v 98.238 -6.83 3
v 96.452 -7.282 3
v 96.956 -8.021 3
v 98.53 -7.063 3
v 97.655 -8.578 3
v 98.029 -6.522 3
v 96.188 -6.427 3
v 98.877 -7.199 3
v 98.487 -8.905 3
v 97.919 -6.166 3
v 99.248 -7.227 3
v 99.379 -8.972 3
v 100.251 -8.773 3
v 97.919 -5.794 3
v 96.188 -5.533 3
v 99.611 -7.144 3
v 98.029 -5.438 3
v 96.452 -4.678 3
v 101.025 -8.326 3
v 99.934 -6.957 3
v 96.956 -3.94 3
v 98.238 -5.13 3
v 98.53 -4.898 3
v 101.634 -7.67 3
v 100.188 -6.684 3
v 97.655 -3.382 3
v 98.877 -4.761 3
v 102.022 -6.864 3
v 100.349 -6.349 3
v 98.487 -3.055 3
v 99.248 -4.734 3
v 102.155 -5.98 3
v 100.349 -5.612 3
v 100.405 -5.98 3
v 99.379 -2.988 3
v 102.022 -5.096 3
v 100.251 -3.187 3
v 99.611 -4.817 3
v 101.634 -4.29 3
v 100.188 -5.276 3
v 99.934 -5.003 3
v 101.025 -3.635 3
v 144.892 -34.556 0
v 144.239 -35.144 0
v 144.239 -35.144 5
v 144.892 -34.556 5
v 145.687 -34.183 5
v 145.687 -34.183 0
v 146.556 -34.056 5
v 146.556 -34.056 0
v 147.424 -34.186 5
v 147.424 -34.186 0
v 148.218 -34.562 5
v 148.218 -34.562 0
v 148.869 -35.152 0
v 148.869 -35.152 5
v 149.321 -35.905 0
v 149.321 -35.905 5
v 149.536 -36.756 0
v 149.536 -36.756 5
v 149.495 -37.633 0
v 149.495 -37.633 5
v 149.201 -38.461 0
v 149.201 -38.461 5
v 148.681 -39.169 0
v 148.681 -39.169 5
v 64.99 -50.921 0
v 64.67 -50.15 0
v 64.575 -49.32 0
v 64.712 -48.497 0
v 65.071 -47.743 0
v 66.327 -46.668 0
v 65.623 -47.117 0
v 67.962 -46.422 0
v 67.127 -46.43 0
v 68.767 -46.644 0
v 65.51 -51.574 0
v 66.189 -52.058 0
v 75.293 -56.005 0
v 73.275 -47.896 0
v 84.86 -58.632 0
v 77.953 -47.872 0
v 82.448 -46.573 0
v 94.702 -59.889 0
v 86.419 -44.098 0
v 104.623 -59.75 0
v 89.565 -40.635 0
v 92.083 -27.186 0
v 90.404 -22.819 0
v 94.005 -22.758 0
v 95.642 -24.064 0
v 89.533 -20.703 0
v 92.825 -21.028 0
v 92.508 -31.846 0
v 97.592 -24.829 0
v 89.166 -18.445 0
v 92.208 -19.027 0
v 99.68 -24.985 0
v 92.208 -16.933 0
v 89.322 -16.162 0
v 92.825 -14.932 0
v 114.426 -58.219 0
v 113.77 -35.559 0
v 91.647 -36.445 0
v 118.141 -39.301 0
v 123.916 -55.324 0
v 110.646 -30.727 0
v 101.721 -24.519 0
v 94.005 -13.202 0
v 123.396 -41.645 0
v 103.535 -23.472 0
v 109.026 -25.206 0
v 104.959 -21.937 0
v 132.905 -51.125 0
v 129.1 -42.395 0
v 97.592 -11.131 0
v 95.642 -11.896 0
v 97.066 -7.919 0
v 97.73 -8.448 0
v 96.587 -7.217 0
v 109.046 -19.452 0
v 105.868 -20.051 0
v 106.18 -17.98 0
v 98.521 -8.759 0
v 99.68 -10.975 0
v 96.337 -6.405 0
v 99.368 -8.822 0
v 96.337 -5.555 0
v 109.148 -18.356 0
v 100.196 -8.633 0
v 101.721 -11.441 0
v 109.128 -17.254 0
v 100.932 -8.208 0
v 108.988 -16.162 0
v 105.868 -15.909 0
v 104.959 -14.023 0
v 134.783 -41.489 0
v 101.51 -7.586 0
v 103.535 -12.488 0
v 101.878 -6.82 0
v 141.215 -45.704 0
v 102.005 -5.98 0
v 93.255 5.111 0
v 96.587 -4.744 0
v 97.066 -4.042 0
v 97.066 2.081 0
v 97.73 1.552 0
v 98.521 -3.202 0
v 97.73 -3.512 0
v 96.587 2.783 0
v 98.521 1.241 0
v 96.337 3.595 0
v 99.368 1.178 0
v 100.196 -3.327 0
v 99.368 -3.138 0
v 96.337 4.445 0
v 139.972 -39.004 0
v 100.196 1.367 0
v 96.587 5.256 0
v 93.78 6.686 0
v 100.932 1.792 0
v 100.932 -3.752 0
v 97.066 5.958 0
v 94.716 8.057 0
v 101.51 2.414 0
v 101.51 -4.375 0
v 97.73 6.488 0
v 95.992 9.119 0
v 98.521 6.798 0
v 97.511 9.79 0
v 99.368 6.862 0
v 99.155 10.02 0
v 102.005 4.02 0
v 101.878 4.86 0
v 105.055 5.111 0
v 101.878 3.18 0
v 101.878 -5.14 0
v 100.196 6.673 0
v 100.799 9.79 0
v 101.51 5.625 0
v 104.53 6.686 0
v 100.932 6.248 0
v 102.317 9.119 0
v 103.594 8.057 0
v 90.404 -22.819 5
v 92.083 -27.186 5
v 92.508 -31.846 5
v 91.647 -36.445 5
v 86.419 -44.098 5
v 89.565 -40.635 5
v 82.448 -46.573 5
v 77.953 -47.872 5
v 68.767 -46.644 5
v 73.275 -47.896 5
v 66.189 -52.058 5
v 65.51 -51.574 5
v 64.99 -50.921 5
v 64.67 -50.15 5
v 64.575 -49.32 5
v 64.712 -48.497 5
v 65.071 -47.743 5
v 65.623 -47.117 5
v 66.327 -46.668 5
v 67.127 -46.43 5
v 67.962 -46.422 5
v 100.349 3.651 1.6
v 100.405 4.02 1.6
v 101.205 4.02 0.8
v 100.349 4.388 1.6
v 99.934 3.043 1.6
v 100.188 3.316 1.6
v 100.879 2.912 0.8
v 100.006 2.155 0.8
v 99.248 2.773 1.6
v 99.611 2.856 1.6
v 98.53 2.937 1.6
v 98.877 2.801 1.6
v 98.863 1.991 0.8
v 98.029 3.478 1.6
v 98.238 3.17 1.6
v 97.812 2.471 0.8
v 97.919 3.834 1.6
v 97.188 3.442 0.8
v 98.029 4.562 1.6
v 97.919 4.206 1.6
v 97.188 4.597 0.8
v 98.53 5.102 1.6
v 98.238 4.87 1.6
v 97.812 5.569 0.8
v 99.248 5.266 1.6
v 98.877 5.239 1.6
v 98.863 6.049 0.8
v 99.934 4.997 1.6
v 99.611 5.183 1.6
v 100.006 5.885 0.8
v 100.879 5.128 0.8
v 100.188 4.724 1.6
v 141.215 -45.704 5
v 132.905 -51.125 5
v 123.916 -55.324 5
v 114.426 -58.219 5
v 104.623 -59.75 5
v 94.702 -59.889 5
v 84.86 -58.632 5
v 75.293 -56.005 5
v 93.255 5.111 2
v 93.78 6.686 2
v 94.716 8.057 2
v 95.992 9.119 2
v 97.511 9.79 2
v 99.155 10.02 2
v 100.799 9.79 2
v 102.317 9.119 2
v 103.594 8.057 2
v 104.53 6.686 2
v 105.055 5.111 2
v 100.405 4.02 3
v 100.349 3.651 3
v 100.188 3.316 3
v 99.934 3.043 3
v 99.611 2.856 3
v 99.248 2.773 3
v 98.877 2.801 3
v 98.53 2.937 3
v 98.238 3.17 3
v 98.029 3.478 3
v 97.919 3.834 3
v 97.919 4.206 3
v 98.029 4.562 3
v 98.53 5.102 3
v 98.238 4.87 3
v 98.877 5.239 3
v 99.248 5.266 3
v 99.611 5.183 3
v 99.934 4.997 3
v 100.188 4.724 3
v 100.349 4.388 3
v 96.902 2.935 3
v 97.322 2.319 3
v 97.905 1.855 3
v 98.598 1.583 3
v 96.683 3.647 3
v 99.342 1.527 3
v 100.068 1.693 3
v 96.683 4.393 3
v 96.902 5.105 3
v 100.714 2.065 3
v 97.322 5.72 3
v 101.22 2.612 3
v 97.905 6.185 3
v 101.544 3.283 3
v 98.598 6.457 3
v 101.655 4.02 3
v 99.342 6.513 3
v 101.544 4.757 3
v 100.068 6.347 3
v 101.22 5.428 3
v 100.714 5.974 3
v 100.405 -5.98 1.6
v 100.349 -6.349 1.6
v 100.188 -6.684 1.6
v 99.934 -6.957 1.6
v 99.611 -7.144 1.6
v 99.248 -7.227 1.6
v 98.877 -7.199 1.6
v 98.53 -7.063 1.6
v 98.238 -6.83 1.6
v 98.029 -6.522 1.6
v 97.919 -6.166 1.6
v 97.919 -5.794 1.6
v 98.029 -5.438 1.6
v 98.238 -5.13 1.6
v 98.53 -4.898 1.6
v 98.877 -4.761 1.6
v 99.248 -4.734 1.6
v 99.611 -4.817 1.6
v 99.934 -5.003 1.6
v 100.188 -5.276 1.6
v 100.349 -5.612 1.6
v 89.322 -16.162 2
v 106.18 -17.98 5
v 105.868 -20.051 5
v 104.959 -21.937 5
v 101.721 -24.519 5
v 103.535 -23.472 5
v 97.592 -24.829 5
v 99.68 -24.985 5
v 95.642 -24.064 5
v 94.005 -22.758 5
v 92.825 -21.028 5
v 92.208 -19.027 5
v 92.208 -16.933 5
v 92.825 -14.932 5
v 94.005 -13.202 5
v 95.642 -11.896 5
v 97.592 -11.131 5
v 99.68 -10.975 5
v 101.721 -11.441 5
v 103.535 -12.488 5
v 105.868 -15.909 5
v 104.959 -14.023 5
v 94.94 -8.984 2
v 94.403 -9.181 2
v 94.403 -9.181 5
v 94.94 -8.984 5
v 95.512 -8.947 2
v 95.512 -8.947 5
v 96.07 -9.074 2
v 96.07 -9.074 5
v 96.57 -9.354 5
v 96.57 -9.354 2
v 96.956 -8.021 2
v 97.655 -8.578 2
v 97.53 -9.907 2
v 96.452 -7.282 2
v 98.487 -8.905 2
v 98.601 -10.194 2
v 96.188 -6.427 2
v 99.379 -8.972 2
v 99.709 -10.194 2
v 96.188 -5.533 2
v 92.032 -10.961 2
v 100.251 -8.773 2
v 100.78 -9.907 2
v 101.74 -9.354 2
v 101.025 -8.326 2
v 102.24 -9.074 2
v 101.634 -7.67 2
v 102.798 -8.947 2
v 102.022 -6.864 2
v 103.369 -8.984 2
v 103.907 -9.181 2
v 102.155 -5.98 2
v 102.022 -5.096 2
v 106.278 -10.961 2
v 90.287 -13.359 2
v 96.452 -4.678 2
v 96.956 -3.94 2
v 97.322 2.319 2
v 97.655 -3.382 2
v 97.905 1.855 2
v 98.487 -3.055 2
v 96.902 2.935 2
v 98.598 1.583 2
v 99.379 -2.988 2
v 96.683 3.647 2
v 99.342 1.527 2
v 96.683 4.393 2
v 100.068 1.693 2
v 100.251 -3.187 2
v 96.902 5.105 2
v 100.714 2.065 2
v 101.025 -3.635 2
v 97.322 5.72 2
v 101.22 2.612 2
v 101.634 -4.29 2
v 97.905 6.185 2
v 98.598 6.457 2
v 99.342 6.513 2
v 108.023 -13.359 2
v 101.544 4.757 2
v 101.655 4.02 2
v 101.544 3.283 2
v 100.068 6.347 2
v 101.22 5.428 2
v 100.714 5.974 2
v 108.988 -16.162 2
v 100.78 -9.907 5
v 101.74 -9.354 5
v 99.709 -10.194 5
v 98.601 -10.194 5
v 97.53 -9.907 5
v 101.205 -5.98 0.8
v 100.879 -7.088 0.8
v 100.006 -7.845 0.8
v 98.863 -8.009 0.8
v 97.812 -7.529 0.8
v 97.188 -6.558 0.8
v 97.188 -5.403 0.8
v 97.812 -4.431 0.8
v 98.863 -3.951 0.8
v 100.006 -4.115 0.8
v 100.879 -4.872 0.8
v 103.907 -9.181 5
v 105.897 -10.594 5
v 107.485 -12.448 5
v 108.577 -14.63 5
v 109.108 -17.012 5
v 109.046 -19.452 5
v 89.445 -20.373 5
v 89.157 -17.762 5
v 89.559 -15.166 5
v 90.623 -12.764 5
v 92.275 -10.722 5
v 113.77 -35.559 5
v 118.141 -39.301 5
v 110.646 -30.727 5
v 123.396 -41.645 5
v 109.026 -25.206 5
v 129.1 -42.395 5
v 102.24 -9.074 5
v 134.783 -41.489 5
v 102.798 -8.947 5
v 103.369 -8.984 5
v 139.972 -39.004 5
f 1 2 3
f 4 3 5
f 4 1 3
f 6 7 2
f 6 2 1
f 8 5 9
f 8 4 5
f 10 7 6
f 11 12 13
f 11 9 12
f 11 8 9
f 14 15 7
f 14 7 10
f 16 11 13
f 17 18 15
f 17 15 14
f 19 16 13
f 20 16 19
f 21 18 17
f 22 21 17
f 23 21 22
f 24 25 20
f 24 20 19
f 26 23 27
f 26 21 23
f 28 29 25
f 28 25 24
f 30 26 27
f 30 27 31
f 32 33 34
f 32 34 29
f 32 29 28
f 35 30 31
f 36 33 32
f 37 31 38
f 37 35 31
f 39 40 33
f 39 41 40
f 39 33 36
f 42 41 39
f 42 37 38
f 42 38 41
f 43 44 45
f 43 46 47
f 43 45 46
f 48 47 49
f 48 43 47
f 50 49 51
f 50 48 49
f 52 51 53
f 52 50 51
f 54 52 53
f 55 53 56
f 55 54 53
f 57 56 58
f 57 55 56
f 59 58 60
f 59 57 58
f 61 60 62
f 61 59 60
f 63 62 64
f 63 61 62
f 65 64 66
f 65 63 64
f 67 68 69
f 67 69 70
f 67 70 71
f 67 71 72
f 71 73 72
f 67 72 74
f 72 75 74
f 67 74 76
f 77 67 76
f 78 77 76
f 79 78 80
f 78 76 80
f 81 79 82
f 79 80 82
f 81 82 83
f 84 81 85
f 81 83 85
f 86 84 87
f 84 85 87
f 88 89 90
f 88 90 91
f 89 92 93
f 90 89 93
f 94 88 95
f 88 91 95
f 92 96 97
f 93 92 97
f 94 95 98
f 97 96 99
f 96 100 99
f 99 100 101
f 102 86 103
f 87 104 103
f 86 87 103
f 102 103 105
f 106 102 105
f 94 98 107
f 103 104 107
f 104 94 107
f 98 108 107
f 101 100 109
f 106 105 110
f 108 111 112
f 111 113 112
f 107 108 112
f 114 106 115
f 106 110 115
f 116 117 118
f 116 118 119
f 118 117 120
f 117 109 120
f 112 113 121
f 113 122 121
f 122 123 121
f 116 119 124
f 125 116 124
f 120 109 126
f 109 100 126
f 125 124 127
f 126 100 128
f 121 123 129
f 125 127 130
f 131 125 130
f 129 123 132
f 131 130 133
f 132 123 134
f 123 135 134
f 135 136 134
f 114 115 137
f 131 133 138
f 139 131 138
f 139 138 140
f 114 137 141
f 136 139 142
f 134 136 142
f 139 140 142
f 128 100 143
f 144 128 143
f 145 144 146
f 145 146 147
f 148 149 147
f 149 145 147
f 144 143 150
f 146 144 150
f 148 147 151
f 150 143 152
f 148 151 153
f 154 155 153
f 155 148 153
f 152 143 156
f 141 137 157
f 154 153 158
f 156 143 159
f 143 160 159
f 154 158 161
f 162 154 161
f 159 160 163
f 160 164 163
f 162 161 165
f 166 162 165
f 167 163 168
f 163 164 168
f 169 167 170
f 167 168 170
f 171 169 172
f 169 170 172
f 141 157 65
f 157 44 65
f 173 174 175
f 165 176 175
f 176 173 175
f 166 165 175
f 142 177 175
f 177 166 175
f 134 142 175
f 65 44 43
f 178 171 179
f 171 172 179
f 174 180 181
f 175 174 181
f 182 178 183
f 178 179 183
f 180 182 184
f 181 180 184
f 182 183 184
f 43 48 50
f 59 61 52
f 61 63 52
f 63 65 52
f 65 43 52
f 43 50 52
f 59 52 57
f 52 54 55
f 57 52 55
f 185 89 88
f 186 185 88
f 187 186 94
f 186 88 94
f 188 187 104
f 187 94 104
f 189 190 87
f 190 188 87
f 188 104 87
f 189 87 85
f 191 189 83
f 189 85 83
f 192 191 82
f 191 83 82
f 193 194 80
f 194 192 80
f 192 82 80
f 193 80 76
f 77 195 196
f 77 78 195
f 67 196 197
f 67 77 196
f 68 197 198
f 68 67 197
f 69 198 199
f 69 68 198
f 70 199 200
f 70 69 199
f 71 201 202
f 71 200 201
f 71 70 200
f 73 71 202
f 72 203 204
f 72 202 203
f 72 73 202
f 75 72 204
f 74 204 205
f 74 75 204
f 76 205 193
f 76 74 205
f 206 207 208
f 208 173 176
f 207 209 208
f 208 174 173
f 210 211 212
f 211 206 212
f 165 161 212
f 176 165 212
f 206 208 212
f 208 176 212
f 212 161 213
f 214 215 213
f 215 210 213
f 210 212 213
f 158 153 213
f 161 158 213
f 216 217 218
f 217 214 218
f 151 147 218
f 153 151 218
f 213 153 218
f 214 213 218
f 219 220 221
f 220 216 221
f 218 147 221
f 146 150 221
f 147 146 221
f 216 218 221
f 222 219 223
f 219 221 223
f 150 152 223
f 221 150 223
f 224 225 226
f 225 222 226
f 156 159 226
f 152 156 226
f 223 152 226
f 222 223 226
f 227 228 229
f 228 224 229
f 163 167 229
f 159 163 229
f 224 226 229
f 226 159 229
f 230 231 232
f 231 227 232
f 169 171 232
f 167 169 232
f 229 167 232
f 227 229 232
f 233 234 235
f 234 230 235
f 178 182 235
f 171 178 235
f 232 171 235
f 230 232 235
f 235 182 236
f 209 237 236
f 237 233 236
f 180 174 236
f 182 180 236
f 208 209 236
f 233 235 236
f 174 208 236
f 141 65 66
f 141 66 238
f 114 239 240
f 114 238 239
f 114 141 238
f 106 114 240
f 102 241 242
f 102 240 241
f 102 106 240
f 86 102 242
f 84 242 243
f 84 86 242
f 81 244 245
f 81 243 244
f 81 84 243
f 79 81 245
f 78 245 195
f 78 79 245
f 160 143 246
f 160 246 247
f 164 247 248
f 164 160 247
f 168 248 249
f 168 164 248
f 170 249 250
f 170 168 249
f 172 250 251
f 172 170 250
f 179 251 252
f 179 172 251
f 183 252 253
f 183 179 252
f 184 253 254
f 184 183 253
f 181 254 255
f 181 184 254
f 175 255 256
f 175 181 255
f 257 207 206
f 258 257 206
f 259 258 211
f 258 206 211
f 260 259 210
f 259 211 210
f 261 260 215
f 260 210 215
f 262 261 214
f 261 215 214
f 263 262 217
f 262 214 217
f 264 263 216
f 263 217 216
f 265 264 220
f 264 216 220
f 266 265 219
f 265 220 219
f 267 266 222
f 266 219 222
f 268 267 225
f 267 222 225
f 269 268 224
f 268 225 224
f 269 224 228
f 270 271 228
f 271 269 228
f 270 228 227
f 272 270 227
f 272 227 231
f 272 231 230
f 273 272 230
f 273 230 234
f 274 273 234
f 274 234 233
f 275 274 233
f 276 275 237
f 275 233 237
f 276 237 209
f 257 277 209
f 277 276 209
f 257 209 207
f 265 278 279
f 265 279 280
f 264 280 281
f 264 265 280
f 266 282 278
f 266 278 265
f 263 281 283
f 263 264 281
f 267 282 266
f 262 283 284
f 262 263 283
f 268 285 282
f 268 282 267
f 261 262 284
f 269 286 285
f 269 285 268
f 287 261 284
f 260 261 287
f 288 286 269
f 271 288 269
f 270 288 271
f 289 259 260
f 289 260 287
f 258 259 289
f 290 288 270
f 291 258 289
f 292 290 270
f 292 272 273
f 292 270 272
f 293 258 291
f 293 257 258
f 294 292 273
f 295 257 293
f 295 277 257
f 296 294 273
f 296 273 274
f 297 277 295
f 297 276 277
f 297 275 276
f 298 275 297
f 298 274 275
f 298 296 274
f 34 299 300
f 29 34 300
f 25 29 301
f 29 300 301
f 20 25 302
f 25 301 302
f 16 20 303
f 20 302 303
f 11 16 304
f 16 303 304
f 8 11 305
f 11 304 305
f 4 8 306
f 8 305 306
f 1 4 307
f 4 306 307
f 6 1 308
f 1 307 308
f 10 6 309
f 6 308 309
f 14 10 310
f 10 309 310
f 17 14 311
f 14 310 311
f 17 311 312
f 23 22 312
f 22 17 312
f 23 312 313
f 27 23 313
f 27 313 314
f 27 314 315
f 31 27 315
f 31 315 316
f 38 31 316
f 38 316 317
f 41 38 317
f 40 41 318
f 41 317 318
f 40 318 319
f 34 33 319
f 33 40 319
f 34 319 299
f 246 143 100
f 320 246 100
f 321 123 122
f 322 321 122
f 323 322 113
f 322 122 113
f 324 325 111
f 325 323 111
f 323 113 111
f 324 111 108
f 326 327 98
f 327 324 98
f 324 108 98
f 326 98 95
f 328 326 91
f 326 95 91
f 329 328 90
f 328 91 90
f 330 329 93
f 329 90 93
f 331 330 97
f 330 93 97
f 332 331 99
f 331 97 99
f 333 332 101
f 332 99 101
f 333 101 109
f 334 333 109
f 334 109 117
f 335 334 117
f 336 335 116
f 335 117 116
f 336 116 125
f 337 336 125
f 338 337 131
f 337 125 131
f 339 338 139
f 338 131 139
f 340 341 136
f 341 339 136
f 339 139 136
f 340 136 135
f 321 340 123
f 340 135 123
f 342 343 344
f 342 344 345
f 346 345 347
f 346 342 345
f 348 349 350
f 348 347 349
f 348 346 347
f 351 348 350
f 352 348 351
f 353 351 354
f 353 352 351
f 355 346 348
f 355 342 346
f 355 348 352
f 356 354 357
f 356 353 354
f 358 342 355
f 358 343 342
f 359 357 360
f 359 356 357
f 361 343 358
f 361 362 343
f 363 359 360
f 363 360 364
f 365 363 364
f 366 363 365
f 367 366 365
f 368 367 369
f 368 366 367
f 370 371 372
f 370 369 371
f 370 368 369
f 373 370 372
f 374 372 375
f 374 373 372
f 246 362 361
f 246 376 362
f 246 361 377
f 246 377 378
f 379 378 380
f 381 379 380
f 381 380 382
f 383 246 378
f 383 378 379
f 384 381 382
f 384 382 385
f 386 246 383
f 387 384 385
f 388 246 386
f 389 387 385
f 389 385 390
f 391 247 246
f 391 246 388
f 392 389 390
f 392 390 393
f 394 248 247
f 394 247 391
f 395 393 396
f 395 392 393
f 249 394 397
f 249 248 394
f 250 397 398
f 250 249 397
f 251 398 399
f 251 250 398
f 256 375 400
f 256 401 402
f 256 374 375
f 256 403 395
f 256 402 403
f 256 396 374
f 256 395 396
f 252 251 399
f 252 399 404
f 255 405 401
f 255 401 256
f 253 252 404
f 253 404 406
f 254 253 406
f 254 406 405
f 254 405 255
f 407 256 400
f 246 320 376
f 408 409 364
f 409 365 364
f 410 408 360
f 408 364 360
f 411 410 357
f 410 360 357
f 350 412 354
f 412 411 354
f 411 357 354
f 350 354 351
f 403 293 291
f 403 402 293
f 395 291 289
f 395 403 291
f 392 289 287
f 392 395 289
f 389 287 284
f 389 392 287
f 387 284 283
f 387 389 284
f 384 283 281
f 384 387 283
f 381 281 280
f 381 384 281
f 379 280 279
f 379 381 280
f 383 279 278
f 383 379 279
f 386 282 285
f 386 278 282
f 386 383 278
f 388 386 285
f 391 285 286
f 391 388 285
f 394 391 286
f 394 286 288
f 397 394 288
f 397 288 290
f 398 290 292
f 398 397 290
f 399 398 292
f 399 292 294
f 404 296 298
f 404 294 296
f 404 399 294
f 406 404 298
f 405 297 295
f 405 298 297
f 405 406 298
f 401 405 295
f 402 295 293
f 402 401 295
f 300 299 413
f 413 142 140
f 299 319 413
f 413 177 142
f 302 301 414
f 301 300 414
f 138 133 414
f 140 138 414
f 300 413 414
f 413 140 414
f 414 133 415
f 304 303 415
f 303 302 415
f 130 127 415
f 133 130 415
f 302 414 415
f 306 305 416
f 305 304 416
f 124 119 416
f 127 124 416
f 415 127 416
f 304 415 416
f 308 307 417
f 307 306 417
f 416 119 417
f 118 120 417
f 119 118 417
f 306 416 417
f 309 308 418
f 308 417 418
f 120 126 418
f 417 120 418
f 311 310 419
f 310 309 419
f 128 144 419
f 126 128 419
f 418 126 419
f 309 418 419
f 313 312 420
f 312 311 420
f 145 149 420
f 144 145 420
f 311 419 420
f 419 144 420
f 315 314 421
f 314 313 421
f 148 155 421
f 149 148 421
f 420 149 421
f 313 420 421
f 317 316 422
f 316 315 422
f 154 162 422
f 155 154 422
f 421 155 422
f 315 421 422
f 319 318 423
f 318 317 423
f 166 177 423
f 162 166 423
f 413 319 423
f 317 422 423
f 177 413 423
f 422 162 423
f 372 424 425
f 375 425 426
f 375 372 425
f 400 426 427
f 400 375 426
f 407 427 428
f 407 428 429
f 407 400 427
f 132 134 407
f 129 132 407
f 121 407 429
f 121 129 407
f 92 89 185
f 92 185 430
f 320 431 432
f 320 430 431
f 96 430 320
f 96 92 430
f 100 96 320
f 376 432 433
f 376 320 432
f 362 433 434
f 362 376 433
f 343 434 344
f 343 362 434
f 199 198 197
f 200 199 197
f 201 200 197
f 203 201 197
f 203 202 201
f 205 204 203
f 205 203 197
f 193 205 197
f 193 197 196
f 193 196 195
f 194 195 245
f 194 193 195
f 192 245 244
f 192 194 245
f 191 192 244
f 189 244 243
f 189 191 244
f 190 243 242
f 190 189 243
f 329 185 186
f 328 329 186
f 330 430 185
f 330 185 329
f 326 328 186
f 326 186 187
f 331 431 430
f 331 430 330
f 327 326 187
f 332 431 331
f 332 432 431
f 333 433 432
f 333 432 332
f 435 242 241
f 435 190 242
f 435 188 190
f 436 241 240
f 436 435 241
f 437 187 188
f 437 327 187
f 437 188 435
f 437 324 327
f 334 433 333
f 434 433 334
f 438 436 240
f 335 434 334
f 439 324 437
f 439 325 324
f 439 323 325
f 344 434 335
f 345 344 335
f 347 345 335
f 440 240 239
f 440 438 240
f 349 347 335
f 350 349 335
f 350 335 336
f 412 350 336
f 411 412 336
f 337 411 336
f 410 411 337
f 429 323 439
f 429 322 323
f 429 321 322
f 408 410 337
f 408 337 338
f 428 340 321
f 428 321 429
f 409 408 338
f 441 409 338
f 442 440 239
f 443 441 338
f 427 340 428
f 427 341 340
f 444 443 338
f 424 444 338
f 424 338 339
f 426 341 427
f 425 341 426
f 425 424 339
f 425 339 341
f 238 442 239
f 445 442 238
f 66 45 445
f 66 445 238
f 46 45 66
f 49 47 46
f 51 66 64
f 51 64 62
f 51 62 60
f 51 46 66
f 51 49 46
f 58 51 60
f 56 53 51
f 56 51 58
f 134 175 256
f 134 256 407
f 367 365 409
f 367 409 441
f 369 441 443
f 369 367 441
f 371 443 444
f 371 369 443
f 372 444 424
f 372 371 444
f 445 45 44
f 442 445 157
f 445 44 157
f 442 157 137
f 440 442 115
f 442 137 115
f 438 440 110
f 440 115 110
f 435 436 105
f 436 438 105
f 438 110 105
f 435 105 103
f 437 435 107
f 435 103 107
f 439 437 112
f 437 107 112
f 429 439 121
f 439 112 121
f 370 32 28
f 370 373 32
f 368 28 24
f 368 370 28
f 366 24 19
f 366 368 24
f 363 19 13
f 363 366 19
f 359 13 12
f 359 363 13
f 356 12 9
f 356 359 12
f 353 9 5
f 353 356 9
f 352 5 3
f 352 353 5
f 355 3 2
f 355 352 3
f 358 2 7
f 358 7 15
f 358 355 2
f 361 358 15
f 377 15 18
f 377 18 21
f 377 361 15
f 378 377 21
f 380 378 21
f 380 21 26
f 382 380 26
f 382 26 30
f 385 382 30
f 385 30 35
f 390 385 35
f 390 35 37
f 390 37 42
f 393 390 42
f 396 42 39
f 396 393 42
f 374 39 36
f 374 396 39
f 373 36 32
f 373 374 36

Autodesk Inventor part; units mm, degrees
ref_plane "YZ Plane" through (0, 0, 0) normal (1, 0, 0) x (0, 1, 0)
ref_plane "XZ Plane" through (0, 0, 0) normal (0, 1, 0) x (-1, 0, 0)
ref_plane "XY Plane" through (0, 0, 0) normal (0, 0, 1) x (1, 0, 0)
sketch "Sketch1" plane through (0, 0, 0) normal (0, 0, 1) x (1, 0, 0)
  line L0 (64.2929, 13) -> (99.1548, 4.0199) construction
  circle A0 centre (64.2929, 13) radius 3 construction
  circle A1 centre (64.2929, 13) radius 4.025 construction
  circle A2 centre (64.2929, 13) radius 7 construction
  arc A3 (102.6474, 8.8986) -> (63.8399, 19.9853) centre (67.7221, -39.8889) ccw construction
  circle A4 centre (99.1548, 4.0199) radius 2.5
  circle A5 centre (99.1548, 4.0199) radius 3.525
  circle A6 centre (99.1548, 4.0199) radius 6
  line L1 (64.2929, 13) -> (98.9408, 0.0186) construction
  line L2 (99.1548, 4.0199) -> (99.1548, -17.9801) construction
  line L3 (99.1548, -17.9801) -> (98.9408, 0.0186) construction
  circle A7 centre (99.1548, -17.9801) radius 10
  circle A8 centre (99.1548, -17.9801) radius 7.025
  line L4 (105.0548, 5.1108) -> (108.9881, -16.162)
  line L5 (93.2548, 5.1108) -> (89.3215, -16.162)
  line L6 (9.3628, -60) -> (214.5663, -60) construction
  arc A9 (95.4028, -0.6623) -> (65.8301, 6.1709) centre (73.5161, -27.9748) ccw construction
  line L7 (99.1548, 4.0199) -> (66.0447, -51.9827) construction
  line L8 (99.1548, 4.0199) -> (148.8226, -39.0251) construction
  circle A10 centre (67.5736, -49.3967) radius 3
  circle A11 centre (146.5507, -37.0561) radius 3
  arc A12 (68.7666, -46.6441) -> (90.4037, -22.8193) centre (75.5268, -31.046) ccw
  arc A13 (109.0459, -19.4522) -> (144.239, -35.1439) centre (128.828, -22.3964) ccw
  arc A14 (66.0447, -51.9827) -> (148.8226, -39.0251) centre (98.68, 10.4177) ccw
  circle A15 centre (99.1548, -5.9801) radius 1.25
  circle A16 centre (99.1548, -5.9801) radius 3
  circle A17 centre (99.1548, -5.9801) radius 4.25
  circle A18 centre (99.1548, 4.0199) radius 1.25
  arc A19 (103.9067, -9.1813) -> (101.7399, -9.3536) centre (102.9564, -10.9411) ccw
  arc A20 (96.5698, -9.3536) -> (94.4029, -9.1813) centre (95.3533, -10.9411) ccw
  point P0 (0, 0)
  point P1 (0, 0)
  point P2 (66.1895, -52.0583)
  point P3 (148.6808, -39.1685)
  point P4 (97.1242, -8.1885)
  point P5 (102.5276, -8.5661)
  point P6 (95.7821, -8.5661)
  dimension "d19" = 6
  dimension "d20" = 6
  dimension "d0" = 36
  dimension "d1" = 8.05
  dimension "d2" = 6
  dimension "d3" = 14
  dimension "d4" = 60
  dimension "d5" = 37
  dimension "d6" = 22
  dimension "d7" = 18
  dimension "d8" = 12
  dimension "d9" = 7.05
  dimension "d10" = 20
  dimension "d11" = 14.05
  dimension "d12" = 35
  dimension "d13" = 5
  dimension "d14" = 60
  dimension "d15" = 30.593
  dimension "d16" = 49.086
  dimension "d17" = 65.7249
  dimension "d18" = 65.0582
  dimension "d21" = 13
  dimension "d22" = 70.4193
  dimension "d23" = 17
  dimension "d24" = 20
  dimension "d29" = 2.5
  dimension "d30" = 6
  dimension "d31" = 8.5
  dimension "d32" = 2.5
  dimension "d43" = 10
  dimension "d44" = 2
  dimension "d45" = 2
extrude "Extrusion1" add sketch "Sketch1" along normal blind 5 contours A7 A20 A17 A19 | A7 A13 A11 A14 A10 A12 | A10 | A11
extrude "Extrusion3" add sketch "Sketch1" along normal blind 3 contours A4 | A16 A7 | A7 A16
extrude "Extrusion4" add sketch "Sketch1" along normal blind 2 contours A5 | A6 A17 | A6 L4 A7 A17 | A17 A7 A16 A6 | A6 A17 | A6 A17 A7 L5 | A19 A17 A7 | A17 A20 A7 | A7 A16 A17 | A7 A16 picked at (99.1548, -8.3289)
chamfer "Chamfer1" distance 1.6 angle 45 1 edges at (97.9048, -5.9801, 0)
chamfer "Chamfer2" distance 1.6 angle 45 1 edges at (97.9048, 4.0199, 0)
properties part number "ヘッケン" material "Polycarbonate, Clear"
